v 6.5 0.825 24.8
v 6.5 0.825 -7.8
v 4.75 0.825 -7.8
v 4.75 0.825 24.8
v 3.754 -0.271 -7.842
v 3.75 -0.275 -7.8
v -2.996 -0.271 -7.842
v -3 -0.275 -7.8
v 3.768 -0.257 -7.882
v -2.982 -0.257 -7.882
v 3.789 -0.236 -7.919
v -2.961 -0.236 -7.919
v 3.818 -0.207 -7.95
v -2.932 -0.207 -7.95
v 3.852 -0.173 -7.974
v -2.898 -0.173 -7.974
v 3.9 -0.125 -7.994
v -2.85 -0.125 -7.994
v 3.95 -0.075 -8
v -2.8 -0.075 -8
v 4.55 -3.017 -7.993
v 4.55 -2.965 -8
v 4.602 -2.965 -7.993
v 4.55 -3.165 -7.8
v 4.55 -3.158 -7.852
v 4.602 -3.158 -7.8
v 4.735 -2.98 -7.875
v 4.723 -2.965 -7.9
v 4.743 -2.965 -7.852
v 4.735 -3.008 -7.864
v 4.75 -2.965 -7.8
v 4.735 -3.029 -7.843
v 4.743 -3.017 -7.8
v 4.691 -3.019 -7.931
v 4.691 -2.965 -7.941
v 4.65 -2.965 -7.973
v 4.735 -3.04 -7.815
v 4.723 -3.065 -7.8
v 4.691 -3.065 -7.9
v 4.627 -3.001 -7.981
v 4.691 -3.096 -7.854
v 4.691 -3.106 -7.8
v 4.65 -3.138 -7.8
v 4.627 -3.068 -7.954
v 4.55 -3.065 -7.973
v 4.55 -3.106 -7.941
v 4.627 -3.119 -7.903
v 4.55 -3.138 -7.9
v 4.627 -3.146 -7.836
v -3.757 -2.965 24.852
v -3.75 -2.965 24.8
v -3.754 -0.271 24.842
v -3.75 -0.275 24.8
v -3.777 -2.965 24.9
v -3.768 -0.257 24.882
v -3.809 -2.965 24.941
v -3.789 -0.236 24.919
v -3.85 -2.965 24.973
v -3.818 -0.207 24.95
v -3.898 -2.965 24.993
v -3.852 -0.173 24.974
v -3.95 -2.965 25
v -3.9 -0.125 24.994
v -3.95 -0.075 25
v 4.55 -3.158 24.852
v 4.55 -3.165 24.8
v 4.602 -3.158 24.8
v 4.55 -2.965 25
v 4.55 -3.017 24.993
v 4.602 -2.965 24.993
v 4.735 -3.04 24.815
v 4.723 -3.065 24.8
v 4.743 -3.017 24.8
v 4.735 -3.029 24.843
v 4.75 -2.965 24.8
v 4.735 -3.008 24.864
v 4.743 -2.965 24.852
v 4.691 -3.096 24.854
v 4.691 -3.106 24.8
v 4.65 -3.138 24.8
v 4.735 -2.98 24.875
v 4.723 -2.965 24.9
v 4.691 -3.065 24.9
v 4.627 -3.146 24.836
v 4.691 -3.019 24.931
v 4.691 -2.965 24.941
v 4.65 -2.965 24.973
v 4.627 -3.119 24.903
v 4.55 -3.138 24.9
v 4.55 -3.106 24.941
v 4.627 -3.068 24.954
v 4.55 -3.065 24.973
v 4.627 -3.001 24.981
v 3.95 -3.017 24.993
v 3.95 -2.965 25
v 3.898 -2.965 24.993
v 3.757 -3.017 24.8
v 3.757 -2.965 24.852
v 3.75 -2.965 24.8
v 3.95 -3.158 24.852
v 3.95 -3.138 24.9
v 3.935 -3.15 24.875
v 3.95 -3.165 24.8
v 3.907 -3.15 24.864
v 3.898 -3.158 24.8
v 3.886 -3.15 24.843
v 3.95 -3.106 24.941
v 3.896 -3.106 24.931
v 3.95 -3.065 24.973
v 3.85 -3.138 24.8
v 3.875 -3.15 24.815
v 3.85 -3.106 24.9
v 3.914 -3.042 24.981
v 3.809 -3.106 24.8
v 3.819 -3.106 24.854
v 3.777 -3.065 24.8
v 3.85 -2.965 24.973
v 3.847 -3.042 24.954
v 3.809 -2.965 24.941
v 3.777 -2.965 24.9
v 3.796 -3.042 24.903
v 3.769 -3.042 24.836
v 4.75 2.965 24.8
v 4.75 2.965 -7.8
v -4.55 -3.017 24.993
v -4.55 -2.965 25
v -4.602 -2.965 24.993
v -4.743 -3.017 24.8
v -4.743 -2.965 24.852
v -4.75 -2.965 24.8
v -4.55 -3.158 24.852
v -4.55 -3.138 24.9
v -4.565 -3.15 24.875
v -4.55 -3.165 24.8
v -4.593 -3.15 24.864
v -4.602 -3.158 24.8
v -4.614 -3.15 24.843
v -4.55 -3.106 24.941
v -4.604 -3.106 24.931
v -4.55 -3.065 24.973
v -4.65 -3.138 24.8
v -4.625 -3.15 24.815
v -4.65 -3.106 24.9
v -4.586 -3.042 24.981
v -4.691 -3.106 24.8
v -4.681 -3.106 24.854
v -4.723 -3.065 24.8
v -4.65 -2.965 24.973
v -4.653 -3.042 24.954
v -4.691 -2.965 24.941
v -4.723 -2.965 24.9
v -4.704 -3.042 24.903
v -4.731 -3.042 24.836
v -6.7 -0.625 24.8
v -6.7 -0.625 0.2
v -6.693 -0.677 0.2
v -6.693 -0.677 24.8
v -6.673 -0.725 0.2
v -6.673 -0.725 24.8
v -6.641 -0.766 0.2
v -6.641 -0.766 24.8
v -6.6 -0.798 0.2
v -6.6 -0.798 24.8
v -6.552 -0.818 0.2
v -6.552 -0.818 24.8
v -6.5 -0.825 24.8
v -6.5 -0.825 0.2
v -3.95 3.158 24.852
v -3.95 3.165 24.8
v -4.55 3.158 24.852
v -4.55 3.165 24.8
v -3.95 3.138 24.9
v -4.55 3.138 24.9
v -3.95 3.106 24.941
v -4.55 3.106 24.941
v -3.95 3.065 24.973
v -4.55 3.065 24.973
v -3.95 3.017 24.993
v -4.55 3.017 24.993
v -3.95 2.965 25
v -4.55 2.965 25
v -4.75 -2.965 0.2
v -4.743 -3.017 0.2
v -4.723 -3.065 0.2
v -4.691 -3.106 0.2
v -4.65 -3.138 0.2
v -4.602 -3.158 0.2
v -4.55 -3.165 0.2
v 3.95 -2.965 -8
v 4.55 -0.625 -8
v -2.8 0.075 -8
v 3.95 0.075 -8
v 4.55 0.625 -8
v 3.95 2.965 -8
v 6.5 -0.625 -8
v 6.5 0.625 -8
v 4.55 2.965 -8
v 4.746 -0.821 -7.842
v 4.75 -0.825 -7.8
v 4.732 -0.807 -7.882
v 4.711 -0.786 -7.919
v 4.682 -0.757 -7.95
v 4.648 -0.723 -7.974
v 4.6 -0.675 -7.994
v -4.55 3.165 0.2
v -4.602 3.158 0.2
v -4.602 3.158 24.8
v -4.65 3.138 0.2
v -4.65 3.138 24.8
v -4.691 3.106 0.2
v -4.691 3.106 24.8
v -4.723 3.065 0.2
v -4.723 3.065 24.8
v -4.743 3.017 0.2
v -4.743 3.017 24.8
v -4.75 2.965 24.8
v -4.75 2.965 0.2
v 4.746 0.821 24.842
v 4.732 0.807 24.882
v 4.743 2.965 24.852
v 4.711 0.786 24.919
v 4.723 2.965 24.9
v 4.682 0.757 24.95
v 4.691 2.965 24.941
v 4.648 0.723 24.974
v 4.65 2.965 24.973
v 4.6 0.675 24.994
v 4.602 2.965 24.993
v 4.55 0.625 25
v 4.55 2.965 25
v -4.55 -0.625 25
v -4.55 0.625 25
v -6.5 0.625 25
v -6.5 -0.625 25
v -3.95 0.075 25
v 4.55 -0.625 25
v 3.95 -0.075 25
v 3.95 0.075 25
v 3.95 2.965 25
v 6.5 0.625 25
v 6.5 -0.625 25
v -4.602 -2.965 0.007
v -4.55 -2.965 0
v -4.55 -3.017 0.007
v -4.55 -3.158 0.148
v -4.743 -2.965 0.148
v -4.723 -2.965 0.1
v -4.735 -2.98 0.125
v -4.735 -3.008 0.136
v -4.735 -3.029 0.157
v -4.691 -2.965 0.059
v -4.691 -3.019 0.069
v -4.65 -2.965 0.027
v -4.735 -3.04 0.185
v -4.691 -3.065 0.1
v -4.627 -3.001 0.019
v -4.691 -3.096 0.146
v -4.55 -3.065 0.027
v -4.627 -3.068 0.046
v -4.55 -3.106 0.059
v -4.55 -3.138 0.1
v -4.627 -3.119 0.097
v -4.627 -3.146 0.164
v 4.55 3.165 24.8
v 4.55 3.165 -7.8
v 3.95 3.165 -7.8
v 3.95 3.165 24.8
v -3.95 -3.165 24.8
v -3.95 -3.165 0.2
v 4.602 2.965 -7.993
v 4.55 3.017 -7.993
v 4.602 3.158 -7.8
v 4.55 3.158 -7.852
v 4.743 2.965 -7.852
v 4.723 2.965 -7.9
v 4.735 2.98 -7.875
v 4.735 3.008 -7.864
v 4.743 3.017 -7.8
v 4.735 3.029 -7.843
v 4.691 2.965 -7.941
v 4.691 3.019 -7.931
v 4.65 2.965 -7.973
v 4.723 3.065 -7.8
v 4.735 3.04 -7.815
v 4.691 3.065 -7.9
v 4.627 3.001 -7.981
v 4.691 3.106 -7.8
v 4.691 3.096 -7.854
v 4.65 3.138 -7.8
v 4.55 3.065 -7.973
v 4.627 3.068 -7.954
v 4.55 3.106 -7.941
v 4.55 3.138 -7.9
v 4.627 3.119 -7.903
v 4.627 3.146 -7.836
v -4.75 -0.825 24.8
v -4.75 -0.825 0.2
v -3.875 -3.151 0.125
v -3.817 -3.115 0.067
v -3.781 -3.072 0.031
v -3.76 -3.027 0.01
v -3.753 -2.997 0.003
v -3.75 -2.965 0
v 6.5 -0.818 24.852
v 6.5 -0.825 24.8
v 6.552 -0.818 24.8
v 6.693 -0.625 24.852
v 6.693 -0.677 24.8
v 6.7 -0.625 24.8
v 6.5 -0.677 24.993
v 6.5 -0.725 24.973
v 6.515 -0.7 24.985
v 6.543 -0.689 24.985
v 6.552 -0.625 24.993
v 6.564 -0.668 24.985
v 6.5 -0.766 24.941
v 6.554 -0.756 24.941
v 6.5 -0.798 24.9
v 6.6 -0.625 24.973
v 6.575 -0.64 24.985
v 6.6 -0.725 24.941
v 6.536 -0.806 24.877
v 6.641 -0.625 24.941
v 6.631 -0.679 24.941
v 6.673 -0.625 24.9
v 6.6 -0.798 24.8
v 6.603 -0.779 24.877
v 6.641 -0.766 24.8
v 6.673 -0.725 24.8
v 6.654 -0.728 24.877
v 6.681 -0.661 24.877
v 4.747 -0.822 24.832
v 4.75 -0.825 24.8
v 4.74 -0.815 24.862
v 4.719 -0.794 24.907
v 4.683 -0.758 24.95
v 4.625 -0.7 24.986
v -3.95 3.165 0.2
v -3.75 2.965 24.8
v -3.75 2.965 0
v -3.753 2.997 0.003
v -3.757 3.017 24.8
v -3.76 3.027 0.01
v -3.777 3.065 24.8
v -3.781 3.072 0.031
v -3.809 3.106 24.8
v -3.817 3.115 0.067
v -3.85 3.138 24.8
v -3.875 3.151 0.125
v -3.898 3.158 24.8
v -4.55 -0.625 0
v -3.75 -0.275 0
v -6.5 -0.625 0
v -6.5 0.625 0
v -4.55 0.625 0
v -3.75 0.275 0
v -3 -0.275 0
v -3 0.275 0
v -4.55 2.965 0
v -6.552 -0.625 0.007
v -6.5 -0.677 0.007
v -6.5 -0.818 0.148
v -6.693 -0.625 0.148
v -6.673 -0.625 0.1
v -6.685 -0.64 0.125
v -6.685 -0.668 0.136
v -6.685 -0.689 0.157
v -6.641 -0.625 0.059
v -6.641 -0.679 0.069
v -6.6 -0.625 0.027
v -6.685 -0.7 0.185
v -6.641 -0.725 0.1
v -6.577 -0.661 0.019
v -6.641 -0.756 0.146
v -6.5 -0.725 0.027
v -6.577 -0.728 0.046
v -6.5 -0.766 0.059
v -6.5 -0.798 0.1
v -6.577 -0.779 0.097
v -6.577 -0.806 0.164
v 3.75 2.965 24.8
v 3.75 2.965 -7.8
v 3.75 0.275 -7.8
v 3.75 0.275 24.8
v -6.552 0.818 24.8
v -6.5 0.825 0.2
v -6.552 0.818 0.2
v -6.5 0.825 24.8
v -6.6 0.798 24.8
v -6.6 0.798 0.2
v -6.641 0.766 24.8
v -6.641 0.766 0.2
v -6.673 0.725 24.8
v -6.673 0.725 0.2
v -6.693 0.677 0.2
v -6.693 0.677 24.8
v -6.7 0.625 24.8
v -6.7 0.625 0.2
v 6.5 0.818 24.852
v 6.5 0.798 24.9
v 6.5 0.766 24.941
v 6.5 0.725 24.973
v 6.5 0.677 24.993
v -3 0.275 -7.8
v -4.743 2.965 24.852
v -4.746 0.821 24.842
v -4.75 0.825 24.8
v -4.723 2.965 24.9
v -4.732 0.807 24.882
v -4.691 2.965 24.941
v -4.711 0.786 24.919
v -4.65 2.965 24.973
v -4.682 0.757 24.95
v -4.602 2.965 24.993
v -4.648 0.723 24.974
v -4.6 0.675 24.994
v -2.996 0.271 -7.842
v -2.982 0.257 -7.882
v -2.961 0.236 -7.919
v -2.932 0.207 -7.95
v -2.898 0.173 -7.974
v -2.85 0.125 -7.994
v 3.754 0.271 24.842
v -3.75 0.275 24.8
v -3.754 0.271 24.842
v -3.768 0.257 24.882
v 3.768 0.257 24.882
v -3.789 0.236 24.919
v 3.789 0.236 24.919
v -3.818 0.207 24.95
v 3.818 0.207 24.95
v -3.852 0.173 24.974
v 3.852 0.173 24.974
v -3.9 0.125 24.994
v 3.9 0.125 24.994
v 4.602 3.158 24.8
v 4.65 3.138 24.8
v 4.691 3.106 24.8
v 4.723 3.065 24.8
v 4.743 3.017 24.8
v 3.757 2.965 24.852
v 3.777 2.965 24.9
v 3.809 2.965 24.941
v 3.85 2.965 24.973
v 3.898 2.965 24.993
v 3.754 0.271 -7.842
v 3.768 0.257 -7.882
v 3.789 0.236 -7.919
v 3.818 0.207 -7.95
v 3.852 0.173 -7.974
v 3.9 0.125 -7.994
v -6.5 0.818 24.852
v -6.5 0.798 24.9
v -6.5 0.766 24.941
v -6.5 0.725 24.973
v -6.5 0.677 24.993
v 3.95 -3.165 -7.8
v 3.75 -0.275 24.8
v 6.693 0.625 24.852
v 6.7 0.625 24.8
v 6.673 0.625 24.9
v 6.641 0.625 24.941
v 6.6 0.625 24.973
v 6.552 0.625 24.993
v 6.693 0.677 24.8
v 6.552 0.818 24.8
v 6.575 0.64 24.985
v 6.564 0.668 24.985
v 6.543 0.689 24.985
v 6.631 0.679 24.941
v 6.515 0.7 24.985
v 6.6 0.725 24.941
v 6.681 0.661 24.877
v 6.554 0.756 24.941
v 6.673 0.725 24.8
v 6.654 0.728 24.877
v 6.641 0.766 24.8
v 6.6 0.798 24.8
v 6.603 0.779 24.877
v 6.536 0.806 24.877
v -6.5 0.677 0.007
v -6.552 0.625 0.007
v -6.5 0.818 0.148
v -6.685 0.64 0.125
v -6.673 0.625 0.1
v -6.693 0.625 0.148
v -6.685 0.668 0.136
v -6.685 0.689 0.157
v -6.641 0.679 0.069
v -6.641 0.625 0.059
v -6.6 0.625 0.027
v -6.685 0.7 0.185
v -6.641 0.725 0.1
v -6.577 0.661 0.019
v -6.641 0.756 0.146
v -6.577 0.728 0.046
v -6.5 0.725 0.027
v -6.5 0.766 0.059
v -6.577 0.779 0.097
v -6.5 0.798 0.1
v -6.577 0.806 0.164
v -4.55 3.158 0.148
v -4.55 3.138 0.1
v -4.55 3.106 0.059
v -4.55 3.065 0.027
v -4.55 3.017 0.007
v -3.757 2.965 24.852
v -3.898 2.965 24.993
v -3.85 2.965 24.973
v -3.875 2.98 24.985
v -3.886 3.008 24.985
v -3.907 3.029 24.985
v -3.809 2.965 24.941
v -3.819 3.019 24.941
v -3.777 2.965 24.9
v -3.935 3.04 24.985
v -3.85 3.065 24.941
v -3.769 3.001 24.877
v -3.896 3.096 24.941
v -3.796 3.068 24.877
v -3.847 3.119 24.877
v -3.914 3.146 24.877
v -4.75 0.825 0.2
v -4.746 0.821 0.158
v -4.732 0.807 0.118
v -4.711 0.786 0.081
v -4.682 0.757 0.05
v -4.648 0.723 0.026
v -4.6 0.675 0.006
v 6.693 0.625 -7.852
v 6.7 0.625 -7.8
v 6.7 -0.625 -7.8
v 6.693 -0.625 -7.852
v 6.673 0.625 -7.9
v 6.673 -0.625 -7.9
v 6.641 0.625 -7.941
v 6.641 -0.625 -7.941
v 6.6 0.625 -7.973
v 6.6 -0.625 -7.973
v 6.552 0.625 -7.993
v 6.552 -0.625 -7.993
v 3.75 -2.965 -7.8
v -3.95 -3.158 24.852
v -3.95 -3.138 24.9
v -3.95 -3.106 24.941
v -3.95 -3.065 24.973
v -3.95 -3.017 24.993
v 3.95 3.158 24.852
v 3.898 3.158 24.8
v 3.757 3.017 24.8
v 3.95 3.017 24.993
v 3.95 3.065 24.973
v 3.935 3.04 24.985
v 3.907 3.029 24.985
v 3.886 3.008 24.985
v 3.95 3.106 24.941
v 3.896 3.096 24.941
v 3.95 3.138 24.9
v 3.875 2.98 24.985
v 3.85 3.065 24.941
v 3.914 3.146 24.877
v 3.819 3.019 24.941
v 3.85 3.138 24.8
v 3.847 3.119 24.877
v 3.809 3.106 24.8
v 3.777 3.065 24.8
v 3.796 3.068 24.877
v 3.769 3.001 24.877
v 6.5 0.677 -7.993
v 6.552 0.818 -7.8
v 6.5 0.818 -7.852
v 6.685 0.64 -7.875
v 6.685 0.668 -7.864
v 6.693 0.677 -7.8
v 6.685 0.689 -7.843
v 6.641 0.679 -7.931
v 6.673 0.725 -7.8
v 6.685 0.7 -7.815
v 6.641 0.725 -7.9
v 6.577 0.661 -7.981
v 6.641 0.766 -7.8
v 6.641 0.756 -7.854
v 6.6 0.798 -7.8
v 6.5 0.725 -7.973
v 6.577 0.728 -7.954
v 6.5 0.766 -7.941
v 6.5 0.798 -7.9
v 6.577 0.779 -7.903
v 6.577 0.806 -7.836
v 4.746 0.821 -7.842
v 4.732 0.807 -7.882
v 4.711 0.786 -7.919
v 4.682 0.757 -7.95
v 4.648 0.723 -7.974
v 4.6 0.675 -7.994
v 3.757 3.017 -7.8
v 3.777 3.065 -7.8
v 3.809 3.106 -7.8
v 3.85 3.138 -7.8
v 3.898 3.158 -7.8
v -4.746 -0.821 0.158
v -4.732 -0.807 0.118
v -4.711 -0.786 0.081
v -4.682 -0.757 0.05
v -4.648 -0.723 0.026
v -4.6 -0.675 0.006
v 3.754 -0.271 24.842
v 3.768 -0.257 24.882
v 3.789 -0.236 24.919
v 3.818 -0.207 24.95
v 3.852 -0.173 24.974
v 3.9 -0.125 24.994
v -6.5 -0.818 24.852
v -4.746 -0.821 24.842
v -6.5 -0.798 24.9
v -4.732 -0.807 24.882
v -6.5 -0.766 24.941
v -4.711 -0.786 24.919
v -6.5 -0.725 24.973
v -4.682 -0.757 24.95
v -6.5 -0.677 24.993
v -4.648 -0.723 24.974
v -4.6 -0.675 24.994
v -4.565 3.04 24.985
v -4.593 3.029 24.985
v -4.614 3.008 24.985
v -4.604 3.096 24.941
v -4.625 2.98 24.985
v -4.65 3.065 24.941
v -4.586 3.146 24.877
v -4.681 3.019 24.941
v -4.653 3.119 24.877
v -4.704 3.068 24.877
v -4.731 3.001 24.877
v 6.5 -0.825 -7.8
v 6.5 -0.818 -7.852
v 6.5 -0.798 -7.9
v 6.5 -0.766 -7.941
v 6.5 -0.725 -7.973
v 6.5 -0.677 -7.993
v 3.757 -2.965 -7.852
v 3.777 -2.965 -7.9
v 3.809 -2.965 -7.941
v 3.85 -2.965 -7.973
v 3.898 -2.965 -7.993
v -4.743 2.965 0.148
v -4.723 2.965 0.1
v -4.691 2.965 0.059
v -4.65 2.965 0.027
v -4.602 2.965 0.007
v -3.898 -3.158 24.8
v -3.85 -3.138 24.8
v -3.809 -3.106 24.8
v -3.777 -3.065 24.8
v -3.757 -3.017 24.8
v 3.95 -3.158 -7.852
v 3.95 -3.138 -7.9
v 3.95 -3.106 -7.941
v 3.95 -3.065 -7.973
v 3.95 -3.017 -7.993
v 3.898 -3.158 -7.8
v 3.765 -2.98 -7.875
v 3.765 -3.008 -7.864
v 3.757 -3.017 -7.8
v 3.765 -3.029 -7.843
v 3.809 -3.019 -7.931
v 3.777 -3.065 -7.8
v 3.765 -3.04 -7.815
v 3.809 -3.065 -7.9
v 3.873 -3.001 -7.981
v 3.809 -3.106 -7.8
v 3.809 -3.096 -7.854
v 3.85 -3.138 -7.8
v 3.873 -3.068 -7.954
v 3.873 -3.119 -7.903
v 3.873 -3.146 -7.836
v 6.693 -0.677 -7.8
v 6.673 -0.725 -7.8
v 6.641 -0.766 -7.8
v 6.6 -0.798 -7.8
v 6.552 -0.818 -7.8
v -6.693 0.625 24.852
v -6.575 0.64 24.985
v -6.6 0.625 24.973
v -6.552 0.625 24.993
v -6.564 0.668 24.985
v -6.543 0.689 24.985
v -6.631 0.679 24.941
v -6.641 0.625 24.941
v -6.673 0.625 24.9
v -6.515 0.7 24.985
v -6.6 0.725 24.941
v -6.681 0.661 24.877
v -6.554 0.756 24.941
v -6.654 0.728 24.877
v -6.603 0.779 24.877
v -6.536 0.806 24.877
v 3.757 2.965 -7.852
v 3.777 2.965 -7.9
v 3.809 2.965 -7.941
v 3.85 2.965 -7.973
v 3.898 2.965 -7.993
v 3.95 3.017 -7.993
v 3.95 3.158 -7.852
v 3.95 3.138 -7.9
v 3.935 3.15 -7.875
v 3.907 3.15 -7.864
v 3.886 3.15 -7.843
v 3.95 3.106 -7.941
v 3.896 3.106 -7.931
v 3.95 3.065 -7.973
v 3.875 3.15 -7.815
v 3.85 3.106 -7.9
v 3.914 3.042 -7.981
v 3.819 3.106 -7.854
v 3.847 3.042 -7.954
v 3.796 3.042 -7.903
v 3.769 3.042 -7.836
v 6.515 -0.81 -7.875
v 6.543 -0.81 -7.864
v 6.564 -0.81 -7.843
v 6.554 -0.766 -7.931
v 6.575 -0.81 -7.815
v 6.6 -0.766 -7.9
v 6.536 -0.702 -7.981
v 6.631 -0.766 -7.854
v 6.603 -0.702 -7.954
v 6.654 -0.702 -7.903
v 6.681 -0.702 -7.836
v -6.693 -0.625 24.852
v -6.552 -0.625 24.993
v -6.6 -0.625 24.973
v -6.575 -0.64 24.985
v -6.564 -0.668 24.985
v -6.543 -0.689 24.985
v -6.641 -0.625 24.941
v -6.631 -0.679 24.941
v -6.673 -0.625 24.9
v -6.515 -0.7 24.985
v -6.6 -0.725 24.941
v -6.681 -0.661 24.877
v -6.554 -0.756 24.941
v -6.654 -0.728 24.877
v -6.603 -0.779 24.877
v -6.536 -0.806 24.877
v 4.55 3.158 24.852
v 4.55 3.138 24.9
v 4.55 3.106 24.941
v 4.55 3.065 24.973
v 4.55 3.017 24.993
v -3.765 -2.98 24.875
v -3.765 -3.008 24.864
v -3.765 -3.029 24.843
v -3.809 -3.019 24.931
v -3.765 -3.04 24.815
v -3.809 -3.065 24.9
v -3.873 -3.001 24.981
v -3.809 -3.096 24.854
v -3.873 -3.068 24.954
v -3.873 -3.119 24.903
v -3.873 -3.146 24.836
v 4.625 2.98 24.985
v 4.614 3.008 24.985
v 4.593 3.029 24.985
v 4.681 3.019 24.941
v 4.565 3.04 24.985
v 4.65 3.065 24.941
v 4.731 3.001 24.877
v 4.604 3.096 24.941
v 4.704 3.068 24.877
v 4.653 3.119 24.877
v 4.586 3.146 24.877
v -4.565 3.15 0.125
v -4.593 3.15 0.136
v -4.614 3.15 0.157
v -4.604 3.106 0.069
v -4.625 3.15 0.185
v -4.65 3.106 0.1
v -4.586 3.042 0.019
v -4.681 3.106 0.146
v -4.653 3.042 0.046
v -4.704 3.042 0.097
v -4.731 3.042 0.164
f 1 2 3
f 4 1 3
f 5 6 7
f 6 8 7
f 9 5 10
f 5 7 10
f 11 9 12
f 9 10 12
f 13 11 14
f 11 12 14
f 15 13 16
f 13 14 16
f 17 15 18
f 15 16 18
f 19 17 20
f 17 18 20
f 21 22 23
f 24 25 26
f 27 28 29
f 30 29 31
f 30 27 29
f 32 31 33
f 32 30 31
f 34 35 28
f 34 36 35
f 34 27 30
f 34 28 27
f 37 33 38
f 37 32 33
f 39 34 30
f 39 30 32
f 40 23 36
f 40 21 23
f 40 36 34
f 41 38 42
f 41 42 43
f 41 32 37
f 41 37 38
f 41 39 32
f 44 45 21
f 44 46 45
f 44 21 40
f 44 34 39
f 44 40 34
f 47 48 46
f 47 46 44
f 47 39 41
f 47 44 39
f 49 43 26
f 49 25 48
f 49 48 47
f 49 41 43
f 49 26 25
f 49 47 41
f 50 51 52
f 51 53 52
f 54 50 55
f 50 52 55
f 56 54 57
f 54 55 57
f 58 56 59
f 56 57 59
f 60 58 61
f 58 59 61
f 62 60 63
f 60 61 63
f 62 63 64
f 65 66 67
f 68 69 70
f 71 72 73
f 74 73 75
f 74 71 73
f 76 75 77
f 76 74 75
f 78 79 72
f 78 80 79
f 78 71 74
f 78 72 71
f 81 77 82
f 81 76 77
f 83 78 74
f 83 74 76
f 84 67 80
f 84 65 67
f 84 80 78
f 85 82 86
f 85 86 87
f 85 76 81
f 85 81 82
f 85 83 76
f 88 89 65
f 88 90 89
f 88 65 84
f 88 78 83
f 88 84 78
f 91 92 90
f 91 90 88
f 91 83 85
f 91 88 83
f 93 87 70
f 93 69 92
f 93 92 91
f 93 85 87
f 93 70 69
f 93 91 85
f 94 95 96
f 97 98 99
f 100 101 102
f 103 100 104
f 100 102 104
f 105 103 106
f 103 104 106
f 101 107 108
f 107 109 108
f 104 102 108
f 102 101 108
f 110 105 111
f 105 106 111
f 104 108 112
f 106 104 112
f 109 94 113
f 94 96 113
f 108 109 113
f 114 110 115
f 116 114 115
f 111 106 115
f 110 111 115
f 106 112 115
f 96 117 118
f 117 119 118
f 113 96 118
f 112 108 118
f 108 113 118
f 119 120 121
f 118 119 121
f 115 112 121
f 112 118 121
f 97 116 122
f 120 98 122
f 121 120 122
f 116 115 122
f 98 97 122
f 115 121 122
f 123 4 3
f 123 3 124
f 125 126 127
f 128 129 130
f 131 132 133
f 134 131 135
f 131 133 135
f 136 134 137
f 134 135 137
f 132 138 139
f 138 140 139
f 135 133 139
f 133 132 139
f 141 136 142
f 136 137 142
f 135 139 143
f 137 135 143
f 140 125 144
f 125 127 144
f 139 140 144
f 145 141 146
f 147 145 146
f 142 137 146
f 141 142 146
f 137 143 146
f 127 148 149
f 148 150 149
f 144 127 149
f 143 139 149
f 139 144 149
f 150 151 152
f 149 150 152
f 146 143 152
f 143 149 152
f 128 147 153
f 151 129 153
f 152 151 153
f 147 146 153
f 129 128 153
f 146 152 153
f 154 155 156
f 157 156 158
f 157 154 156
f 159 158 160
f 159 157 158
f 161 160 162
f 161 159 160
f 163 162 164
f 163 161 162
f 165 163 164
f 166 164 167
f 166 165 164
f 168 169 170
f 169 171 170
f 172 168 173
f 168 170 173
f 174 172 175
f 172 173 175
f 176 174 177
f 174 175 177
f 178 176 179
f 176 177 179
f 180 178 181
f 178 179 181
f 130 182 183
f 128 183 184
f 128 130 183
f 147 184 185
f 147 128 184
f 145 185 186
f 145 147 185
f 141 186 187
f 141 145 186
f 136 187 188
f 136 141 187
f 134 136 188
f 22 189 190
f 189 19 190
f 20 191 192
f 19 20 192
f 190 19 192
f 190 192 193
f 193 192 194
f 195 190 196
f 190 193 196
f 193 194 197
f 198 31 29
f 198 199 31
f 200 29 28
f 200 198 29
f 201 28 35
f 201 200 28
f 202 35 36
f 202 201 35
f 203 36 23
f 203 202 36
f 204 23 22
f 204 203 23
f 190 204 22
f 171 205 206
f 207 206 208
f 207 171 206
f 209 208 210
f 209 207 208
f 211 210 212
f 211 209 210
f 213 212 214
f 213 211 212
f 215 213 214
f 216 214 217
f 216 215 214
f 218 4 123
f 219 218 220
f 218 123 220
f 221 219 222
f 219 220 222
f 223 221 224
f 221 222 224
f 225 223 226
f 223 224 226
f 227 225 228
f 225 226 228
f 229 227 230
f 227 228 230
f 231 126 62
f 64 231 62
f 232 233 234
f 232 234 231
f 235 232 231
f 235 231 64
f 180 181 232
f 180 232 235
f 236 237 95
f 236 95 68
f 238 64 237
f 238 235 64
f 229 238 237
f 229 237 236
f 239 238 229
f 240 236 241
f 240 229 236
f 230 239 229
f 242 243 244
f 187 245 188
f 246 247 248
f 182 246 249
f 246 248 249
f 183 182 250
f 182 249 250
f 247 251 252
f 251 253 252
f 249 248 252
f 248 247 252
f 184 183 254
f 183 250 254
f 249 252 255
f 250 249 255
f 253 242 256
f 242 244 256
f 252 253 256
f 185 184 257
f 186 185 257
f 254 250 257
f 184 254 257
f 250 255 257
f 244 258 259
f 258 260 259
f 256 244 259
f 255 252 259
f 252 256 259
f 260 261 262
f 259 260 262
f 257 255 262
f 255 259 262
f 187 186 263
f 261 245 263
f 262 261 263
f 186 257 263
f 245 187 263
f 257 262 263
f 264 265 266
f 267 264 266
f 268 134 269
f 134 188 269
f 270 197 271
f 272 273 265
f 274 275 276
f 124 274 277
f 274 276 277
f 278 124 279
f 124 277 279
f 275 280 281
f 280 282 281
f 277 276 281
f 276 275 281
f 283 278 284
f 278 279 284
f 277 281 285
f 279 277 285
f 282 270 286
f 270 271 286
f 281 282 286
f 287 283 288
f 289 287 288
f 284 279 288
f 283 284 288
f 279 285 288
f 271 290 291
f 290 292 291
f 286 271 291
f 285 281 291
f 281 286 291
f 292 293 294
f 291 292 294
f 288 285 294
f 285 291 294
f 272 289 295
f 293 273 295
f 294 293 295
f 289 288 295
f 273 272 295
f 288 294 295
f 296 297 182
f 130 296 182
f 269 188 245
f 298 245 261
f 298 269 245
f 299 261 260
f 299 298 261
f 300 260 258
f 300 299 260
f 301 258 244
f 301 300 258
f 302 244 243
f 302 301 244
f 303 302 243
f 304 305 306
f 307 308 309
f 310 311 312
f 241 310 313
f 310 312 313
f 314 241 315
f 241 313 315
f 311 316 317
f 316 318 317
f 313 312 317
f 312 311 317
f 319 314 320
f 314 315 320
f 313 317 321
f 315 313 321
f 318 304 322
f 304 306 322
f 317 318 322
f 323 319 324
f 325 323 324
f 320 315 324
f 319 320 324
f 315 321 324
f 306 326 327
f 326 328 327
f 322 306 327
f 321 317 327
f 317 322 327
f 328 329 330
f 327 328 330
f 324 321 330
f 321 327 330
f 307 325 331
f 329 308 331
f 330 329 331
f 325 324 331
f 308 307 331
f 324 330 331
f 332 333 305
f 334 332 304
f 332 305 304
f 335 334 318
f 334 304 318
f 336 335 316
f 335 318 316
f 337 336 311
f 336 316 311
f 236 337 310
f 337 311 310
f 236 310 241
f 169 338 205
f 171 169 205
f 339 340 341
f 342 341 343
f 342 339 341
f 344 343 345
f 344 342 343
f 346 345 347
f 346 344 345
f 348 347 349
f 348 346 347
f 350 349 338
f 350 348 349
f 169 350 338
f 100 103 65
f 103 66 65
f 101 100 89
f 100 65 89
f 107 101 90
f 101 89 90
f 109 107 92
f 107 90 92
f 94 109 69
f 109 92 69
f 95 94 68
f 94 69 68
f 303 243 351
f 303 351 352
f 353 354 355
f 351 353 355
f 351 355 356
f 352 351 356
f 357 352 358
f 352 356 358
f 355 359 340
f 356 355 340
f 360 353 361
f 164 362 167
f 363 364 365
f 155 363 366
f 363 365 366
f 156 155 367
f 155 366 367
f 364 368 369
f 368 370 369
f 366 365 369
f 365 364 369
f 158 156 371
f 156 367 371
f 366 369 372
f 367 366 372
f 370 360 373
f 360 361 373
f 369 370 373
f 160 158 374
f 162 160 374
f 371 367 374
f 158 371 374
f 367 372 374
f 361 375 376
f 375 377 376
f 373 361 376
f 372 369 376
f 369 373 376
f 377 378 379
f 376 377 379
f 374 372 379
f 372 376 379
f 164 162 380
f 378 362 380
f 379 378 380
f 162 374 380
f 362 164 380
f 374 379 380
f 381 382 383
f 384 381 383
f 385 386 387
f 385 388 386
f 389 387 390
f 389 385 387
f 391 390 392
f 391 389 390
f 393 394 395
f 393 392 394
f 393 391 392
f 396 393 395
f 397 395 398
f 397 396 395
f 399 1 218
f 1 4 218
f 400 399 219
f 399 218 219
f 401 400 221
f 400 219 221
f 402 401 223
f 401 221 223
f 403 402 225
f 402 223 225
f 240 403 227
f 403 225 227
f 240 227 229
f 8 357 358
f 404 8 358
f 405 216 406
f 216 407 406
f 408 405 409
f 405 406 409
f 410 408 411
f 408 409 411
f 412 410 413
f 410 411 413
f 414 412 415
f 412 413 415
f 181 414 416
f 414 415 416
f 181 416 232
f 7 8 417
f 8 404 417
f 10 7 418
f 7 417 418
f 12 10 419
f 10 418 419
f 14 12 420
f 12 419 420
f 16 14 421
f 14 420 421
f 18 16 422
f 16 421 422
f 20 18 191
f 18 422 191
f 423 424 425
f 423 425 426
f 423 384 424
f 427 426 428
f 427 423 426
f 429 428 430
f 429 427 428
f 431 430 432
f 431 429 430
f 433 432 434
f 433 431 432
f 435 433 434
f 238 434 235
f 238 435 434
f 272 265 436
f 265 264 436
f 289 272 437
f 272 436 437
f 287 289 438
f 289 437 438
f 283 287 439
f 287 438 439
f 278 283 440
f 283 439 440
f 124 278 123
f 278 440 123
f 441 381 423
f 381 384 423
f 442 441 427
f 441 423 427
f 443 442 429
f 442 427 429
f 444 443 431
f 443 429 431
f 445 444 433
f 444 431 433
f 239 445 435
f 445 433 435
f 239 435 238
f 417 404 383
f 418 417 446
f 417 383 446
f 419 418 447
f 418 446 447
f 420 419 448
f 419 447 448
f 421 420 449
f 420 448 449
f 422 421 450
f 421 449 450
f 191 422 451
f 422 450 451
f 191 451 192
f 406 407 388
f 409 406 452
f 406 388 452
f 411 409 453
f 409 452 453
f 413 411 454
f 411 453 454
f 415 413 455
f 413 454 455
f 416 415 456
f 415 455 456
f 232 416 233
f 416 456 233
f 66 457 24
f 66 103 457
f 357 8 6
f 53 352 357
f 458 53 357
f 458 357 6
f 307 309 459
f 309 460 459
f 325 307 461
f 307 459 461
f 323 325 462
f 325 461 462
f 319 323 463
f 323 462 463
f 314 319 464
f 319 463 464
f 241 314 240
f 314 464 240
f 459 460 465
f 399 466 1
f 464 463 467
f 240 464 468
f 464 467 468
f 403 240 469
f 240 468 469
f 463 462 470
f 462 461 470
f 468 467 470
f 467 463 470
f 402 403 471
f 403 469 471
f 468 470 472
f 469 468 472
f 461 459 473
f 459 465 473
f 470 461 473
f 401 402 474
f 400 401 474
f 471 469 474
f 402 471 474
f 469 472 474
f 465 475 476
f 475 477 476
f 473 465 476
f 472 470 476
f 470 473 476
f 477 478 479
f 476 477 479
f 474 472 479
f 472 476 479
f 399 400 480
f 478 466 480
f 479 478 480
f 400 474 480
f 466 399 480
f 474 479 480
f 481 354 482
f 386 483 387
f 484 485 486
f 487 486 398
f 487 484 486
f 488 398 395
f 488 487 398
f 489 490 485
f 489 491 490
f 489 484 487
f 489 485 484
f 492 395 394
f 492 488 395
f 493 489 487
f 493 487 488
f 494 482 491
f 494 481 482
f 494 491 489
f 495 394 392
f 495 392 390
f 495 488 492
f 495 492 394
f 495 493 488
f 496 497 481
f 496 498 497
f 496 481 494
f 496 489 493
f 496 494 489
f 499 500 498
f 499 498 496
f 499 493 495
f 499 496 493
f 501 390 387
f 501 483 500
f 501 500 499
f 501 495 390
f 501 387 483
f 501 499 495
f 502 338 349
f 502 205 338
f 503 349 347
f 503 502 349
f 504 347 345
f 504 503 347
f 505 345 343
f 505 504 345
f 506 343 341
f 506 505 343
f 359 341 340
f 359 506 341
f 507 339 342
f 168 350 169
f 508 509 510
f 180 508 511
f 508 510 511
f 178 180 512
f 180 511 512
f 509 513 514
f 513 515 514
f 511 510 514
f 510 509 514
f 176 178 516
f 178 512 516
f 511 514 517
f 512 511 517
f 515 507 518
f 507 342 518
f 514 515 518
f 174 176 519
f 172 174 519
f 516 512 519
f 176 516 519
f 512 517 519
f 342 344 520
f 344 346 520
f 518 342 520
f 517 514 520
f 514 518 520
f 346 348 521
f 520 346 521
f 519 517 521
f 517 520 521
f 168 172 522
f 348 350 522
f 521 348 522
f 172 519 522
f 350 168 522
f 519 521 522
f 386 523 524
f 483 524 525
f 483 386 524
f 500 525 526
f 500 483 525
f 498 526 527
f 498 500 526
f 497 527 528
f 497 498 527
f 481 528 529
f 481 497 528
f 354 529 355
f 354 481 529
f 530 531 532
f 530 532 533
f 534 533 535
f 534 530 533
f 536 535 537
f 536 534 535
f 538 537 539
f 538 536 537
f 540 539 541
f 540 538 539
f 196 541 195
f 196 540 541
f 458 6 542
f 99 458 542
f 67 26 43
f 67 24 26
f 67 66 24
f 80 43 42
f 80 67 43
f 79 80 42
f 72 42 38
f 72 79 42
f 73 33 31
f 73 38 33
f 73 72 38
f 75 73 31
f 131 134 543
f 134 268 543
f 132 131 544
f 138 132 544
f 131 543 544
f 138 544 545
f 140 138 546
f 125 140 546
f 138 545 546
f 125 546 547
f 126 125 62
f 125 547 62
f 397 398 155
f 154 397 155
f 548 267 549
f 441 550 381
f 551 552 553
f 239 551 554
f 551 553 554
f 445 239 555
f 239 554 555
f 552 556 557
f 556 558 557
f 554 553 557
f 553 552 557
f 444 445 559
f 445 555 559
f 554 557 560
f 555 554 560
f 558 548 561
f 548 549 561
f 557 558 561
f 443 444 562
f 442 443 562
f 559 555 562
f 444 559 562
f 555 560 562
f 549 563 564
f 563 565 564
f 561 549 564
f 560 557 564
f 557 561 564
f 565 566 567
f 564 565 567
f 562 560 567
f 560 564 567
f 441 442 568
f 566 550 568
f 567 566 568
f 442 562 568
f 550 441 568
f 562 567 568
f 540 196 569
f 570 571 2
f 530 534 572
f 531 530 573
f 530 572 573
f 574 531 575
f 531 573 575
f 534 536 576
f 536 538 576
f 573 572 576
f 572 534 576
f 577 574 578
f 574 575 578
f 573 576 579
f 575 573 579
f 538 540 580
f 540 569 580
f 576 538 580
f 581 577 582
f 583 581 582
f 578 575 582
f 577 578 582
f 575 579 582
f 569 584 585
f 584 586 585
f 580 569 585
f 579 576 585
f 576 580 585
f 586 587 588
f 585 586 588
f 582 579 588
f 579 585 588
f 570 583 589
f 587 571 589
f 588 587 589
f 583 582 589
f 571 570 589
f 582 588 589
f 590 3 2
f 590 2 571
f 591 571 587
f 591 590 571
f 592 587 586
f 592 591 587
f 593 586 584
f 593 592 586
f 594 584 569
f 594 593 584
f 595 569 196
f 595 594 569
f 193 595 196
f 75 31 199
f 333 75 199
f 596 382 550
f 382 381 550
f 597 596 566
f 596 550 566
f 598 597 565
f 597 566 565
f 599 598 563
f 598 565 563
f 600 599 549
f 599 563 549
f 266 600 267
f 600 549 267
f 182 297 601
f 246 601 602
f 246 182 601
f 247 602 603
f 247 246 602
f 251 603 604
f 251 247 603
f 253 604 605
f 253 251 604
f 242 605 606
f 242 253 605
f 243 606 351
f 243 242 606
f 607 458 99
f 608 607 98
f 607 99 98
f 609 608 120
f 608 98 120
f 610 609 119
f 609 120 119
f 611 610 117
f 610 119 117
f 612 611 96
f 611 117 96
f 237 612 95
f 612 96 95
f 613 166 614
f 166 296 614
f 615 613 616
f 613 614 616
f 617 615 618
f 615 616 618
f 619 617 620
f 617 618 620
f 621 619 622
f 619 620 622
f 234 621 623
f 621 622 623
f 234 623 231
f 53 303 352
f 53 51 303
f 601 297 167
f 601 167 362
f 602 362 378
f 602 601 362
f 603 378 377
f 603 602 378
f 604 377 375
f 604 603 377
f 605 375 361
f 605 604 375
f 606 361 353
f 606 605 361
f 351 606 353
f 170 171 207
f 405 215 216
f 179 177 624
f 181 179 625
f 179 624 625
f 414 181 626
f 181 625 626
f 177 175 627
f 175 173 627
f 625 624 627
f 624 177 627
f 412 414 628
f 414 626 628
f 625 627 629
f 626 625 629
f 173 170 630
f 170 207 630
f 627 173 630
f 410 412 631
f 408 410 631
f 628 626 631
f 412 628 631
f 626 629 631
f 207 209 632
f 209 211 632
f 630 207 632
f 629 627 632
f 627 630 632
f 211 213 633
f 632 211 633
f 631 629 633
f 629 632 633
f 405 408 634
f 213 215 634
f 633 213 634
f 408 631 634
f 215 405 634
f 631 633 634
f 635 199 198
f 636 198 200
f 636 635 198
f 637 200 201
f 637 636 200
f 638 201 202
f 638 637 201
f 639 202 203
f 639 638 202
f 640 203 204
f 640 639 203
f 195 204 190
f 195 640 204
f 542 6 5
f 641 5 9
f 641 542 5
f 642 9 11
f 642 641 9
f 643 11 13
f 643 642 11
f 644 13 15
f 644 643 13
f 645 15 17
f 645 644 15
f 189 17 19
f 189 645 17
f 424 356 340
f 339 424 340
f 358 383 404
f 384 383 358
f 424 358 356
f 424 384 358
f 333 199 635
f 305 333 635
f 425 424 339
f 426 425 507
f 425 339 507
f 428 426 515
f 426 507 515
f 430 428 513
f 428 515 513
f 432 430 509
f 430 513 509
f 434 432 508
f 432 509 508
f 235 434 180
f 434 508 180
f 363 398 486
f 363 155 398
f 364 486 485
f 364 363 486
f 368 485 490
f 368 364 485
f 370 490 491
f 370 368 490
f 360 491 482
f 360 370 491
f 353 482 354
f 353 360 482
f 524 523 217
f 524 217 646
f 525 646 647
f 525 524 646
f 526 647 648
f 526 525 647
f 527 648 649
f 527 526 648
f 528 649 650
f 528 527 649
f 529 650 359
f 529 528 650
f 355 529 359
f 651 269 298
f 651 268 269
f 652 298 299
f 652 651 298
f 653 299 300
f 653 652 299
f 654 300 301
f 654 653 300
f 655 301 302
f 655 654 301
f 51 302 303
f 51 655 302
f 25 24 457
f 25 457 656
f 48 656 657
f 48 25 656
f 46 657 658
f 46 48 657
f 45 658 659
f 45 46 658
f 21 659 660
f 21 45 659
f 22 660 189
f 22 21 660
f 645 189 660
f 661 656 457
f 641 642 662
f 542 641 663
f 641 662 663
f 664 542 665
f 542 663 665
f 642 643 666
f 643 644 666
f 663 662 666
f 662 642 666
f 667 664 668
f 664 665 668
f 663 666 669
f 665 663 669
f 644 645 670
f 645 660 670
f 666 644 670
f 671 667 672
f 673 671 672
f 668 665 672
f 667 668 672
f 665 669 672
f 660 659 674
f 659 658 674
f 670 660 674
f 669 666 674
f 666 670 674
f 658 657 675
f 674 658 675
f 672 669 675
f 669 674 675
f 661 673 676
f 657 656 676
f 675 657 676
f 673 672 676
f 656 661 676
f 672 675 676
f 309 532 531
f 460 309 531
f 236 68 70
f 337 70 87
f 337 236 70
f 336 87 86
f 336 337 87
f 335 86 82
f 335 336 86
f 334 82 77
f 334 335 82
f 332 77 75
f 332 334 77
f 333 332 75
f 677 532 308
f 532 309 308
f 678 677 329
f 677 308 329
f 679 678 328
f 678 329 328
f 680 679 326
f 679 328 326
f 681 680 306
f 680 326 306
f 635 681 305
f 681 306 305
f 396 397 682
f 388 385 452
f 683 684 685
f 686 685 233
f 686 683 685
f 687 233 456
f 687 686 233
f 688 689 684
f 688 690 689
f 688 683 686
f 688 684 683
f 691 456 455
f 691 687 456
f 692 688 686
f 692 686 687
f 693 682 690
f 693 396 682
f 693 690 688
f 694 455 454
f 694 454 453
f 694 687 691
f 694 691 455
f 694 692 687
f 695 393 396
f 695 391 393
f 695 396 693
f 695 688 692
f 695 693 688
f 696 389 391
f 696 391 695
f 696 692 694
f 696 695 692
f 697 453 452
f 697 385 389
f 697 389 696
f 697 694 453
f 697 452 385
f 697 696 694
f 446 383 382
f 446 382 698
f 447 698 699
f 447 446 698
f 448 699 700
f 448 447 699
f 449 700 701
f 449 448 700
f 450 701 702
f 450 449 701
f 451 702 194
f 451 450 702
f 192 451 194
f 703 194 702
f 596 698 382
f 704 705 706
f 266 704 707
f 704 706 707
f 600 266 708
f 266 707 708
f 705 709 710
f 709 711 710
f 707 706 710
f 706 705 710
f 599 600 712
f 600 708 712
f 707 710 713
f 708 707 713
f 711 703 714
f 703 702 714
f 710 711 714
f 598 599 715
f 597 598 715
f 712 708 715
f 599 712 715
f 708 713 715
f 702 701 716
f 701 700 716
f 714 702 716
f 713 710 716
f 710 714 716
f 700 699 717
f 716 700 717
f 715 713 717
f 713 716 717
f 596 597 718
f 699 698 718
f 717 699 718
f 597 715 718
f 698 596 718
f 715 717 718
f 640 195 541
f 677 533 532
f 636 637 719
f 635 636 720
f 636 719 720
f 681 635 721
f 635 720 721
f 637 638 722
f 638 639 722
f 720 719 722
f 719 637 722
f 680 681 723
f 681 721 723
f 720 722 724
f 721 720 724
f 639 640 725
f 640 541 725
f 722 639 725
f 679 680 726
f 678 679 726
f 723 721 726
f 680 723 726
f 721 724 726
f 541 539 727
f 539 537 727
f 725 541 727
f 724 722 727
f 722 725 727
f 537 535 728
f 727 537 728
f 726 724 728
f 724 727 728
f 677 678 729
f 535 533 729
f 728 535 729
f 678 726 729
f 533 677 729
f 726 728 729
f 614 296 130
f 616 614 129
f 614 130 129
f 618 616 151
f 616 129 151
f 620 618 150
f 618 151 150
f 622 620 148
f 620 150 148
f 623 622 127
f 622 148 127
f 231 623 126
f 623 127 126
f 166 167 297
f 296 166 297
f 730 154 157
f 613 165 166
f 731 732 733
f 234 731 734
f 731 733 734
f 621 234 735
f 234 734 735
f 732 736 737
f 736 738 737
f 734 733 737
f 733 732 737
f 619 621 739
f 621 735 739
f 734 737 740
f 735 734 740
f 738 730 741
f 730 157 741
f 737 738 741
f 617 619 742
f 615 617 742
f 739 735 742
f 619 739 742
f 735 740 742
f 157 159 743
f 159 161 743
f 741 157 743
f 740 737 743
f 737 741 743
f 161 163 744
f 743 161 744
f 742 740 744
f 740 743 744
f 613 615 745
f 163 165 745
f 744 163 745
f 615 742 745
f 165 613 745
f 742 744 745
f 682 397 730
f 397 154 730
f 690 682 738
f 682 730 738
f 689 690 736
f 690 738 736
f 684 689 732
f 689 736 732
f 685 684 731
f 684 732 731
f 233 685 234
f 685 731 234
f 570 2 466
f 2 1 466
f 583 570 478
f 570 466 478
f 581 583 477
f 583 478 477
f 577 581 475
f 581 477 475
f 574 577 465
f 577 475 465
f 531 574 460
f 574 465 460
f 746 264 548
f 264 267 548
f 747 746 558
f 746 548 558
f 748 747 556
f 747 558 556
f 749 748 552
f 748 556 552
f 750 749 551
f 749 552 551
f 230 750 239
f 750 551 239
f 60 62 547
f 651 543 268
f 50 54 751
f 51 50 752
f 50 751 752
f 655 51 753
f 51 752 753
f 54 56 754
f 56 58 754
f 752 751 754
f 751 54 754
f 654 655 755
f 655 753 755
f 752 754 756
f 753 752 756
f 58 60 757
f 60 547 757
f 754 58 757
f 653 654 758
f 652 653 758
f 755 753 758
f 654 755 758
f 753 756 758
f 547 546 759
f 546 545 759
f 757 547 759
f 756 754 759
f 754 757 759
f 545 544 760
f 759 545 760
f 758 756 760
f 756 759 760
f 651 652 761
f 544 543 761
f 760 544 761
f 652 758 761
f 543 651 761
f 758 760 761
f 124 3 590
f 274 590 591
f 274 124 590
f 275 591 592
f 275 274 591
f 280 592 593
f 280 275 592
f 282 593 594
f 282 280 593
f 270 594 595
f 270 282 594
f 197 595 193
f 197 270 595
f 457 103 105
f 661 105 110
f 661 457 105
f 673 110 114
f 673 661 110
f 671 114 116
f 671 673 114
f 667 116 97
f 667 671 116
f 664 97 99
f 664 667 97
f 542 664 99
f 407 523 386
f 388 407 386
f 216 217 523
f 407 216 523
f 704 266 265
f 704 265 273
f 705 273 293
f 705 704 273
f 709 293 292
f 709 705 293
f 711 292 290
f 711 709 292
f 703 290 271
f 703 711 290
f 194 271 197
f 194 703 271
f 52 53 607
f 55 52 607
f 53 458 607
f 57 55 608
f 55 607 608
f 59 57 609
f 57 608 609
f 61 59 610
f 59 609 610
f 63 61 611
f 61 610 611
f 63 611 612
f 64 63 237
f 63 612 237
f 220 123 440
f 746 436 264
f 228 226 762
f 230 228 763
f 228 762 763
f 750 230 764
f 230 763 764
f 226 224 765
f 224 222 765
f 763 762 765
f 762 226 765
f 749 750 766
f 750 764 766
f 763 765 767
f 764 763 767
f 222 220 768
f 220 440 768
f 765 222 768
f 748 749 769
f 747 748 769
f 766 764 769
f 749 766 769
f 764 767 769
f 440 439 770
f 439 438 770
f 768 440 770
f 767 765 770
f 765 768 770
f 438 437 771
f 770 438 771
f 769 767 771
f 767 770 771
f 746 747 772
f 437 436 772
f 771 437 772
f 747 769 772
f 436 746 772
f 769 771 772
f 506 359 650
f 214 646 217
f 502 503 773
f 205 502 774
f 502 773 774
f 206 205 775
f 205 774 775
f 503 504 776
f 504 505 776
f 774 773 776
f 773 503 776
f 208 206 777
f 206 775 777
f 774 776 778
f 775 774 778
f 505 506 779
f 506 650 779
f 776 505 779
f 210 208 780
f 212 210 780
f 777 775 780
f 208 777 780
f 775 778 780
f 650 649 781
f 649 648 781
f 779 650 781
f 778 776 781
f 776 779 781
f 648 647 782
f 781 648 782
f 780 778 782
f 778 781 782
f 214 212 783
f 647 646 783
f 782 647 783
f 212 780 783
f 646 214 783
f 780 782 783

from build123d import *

# Parameters (mm, degrees)
AUFSATZ_LINEAR_AUSTRAGEN1_DEPTH = 25
SKIZZE2_W                       = 6
SKIZZE2_H                       = 1.65
AUFSATZ_LINEAR_AUSTRAGEN2_DEPTH = 8
SKIZZE3_W                       = 7.5
SKIZZE3_H                       = 0.55
SCHNITT_LINEAR_AUSTRAGEN1_DEPTH = 34
AUFSATZ_LINEAR_AUSTRAGEN3_DEPTH = 8
VERRUNDUNG1_R                   = 0.2


with BuildPart() as part:
    # Skizze1 → Aufsatz-Linear austragen1 (new body)
    with BuildSketch(Plane.XY):
        Polygon((-4.75, 0.825), (-6.7, 0.825), (-6.7, -0.825), (-4.75, -0.825), (-4.75, -3.165), (-3.75, -3.165), (-3.75, -0.825), (3.75, -0.825), (3.75, -3.165), (4.75, -3.165), (4.75, -0.825), (6.7, -0.825), (6.7, 0.825), (4.75, 0.825), (4.75, 3.165), (3.75, 3.165), (3.75, 0.825), (-3.75, 0.825), (-3.75, 3.165), (-4.75, 3.165), align=None)
    extrude(amount=AUFSATZ_LINEAR_AUSTRAGEN1_DEPTH)

    # Skizze2 → Aufsatz-Linear austragen2 (add)
    with BuildSketch(Plane(origin=(0, 0, 0), x_dir=(-1, 0, 0), z_dir=(0, 0, -1))):
        Rectangle(SKIZZE2_W, SKIZZE2_H)
    extrude(amount=AUFSATZ_LINEAR_AUSTRAGEN2_DEPTH)

    # Skizze3 → Schnitt-Linear austragen1 (cut, through all)
    with BuildSketch(Plane.XY.offset(25)):
        with Locations((0, -0.55)):
            Rectangle(SKIZZE3_W, SKIZZE3_H)
        with Locations((0, 0.55)):
            Rectangle(SKIZZE3_W, SKIZZE3_H)
    extrude(amount=-SCHNITT_LINEAR_AUSTRAGEN1_DEPTH, mode=Mode.SUBTRACT)

    # Skizze4 → Aufsatz-Linear austragen3 (add)
    with BuildSketch(Plane(origin=(0, 0, 0), x_dir=(-1, 0, 0), z_dir=(0, 0, -1))):
        Polygon((-3.75, -3.165), (-4.75, -3.165), (-4.75, -0.825), (-6.7, -0.825), (-6.7, 0.825), (-4.75, 0.825), (-4.75, 3.165), (-3.75, 3.165), (-3.75, 0.275), (-3, 0.275), (-3, -0.275), (-3.75, -0.275), align=None)
    extrude(amount=AUFSATZ_LINEAR_AUSTRAGEN3_DEPTH)

    # Verrundung1
    verrundung1_edges = [part.edges().sort_by_distance(p)[0] for p in [
        (4.25, -3.165, -8),
        (3.75, -1.72, -8),
        (3.75, 1.72, -8),
        (4.25, 3.165, -8),
        (4.75, 1.995, -8),
        (5.725, 0.825, -8),
        (6.7, 0, -8),
        (5.725, -0.825, -8),
        (4.75, -1.995, -8),
        (-4.75, -1.995, 25),
        (-4.25, -3.165, 25),
        (-5.725, 0.825, 0),
        (-4.75, 1.995, 0),
        (-4.25, 3.165, 0),
        (-3.75, -1.72, 25),
        (-4.25, -3.165, 0),
        (-4.75, -1.995, 0),
        (-5.725, -0.825, 0),
        (-6.7, 0, 0),
        (3.75, -1.72, 25),
        (4.25, -3.165, 25),
        (-6.7, 0.825, 12.5),
        (-4.75, 3.165, 12.5),
        (-3.75, 3.165, 12.5),
        (3.75, 3.165, 8.5),
        (4.75, 3.165, 8.5),
        (6.7, 0.825, 8.5),
        (6.7, -0.825, 8.5),
        (4.75, -3.165, 8.5),
        (3.75, -3.165, 8.5),
        (-3.75, -3.165, 12.5),
        (-4.75, -3.165, 12.5),
        (-6.7, -0.825, 12.5),
        (4.75, -1.995, 25),
        (5.725, -0.825, 25),
        (6.7, 0, 25),
        (5.725, 0.825, 25),
        (-6.7, 0, 25),
        (4.75, 1.995, 25),
        (4.25, 3.165, 25),
        (3.75, 1.72, 25),
        (-3.75, 1.72, 25),
        (-3, 0, -8),
        (0.375, 0.275, -8),
        (0.375, -0.275, -8),
        (-4.25, 3.165, 25),
        (-4.75, 1.995, 25),
        (-5.725, 0.825, 25),
        (0, -0.275, 25),
        (-5.725, -0.825, 25),
        (0, 0.275, 25),
    ]]
    fillet(verrundung1_edges, radius=VERRUNDUNG1_R)


solid = part.part
